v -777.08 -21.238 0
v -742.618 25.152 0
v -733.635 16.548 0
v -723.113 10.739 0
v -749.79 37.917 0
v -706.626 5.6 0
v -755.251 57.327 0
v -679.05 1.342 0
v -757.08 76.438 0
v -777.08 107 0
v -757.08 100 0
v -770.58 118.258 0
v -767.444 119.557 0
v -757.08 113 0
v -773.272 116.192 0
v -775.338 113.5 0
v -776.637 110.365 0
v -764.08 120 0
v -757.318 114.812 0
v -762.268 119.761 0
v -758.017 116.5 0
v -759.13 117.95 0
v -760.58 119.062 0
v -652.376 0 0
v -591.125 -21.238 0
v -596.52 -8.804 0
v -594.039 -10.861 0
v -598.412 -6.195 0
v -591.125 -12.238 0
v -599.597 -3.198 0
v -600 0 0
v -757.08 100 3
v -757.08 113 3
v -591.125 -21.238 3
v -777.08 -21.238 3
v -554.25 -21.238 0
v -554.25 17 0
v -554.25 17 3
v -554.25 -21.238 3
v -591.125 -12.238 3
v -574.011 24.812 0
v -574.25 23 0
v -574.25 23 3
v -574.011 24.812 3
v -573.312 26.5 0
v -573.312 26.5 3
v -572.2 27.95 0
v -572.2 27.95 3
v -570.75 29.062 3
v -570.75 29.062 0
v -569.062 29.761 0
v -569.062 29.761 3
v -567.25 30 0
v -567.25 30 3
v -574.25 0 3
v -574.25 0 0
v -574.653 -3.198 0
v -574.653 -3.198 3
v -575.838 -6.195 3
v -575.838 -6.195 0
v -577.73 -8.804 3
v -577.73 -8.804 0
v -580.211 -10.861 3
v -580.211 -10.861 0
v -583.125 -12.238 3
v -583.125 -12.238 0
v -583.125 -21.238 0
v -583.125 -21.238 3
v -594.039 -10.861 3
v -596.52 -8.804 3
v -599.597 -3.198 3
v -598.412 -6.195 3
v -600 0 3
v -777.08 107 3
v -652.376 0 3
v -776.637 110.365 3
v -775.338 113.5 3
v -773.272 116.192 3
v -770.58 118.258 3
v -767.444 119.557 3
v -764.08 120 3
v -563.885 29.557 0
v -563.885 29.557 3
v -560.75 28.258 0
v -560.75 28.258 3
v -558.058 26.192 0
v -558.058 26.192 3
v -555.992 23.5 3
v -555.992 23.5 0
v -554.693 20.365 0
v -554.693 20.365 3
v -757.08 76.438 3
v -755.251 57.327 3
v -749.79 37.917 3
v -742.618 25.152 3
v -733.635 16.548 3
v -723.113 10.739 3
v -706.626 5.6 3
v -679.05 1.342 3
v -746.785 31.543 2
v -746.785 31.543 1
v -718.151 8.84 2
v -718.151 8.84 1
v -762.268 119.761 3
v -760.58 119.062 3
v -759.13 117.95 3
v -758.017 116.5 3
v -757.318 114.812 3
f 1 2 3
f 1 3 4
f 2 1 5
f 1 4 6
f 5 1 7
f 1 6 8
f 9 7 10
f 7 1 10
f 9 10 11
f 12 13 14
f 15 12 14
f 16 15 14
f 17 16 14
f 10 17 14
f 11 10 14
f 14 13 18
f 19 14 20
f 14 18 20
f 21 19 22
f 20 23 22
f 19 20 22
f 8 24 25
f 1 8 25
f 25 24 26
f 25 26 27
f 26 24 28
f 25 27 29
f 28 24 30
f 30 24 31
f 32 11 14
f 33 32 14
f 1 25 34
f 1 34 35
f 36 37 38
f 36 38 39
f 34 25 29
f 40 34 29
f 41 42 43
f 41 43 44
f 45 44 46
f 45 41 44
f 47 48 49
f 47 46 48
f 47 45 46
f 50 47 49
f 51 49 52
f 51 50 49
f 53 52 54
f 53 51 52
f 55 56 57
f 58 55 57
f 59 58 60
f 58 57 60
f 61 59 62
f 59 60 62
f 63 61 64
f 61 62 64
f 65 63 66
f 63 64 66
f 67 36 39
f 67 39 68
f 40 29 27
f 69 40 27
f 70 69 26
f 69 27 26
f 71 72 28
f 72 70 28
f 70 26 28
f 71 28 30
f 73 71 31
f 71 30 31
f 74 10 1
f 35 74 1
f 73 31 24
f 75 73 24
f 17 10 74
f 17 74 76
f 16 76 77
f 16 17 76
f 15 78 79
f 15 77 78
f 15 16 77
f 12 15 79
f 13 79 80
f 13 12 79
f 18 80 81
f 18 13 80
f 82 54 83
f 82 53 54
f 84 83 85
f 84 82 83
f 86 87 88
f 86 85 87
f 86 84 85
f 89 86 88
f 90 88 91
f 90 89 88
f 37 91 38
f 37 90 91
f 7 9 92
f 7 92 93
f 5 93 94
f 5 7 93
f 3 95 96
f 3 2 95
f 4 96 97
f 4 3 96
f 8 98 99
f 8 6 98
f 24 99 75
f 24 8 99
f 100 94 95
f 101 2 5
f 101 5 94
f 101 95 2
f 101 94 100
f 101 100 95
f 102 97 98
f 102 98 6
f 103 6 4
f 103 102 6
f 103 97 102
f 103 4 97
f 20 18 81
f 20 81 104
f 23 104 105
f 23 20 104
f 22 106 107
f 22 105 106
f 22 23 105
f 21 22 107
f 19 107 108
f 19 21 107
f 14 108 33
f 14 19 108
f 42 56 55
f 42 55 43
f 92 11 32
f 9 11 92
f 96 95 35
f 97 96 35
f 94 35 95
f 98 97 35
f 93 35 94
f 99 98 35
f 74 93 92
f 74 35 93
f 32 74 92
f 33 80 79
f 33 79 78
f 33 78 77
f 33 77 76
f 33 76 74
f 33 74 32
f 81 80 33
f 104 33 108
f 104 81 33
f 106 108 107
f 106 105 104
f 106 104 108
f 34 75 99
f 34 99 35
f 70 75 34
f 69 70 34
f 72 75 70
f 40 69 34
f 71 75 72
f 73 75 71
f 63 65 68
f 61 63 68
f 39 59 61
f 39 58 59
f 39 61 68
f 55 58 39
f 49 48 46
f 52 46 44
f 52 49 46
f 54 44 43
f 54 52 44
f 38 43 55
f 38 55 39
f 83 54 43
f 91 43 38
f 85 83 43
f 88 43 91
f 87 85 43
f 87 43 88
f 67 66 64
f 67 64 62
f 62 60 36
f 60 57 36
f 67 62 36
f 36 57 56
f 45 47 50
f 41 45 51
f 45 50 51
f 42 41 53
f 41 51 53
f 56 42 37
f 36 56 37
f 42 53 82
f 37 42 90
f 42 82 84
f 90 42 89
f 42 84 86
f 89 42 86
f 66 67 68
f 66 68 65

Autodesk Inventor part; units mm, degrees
ref_plane "YZ Plane" through (0, 0, 0) normal (1, 0, 0) x (0, 1, 0)
ref_plane "XZ Plane" through (0, 0, 0) normal (0, 1, 0) x (-1, 0, 0)
ref_plane "XY Plane" through (0, 0, 0) normal (0, 0, 1) x (1, 0, 0)
sketch "Sketch3" plane through (0, 0, 0) normal (0, 0, 1) x (1, 0, 0)
  circle A0 centre (368.0481, 50) radius 50 construction
  line L0 (368.0481, 0) -> (514.9541, 0) construction
  line L1 (368.0481, 50) -> (514.9541, 50) construction
  line L2 (368.0481, 100) -> (514.9541, 100) construction
  line L3 (368.0481, 50) -> (343.0481, 6.6987) construction
  line L4 (368.0481, 50) -> (324.7469, 25) construction
  line L5 (368.0481, 50) -> (324.7469, 75) construction
  line L6 (343.0481, 93.3013) -> (368.0481, 50) construction
  line L7 (393.0481, 93.3013) -> (368.0481, 50) construction
  line L8 (411.3494, 75) -> (368.0481, 50) construction
  line L9 (411.3494, 25) -> (368.0481, 50) construction
  line L10 (393.0481, 6.6987) -> (368.0481, 50) construction
  line L11 (368.0481, 0) -> (368.0481, 100) construction
  line L12 (418.0481, 50) -> (368.0481, 50) construction
  line L13 (341.8682, 0) -> (341.8682, 100) construction
  line L14 (315.6883, 0) -> (315.6883, 100) construction
  line L15 (289.5083, 0) -> (289.5083, 100) construction
  line L16 (263.3284, 0) -> (263.3284, 100) construction
  line L17 (237.1485, 0) -> (237.1485, 100) construction
  line L18 (210.9685, 0) -> (210.9685, 100) construction
  line L19 (184.7886, 0) -> (184.7886, 100) construction
  line L20 (158.6086, 0) -> (158.6086, 100) construction
  circle A1 centre (315.6883, 50) radius 50 construction
  circle A2 centre (341.8682, 50) radius 50 construction
  circle A3 centre (289.5083, 50) radius 50 construction
  circle A4 centre (263.3284, 50) radius 50 construction
  circle A5 centre (237.1485, 50) radius 50 construction
  circle A6 centre (210.9685, 50) radius 50 construction
  line L21 (393.0481, 6.6987) -> (514.9541, 6.6987) construction
  line L22 (411.3494, 25) -> (514.9541, 25) construction
  line L23 (411.3494, 75) -> (514.9541, 75) construction
  line L24 (411.3494, 75) -> (514.9541, 75) construction
  line L25 (393.0481, 93.3013) -> (514.9541, 93.3013) construction
  line L26 (358.9895, 75) -> (339.5083, 50) construction
  line L27 (339.5083, 50) -> (306.6297, 25) construction
  line L28 (306.6297, 25) -> (262.1485, 6.6987) construction
  line L29 (262.1485, 6.6987) -> (210.9685, 0) construction
  line L30 (105.4843, -12.0642) -> (105.4843, 125.3083) construction
  line L31 (25.75, 0) -> (25.75, 23)
  line L32 (45.75, 17) -> (45.75, -21.2379)
  arc A7 (32.75, 30) -> (25.75, 23) centre (32.75, 23) ccw
  arc A8 (45.75, 17) -> (32.75, 30) centre (32.75, 17) ccw
  line L33 (32.75, 17) -> (45.75, 17) construction
  line L34 (32.75, 17) -> (32.75, 30) construction
  arc A9 (0, 0) -> (8.875, -12.2379) centre (12.875, 0) ccw
  arc A10 (16.875, -12.2379) -> (25.75, 0) centre (12.875, 0) ccw
  line L35 (45.75, -21.2379) -> (16.875, -21.2379)
  line L36 (8.875, -21.2379) -> (-177.0796, -21.2379)
  circle A11 centre (-144.2046, 110.3653) radius 12.875 construction
  line L37 (8.875, -21.2379) -> (8.875, -12.2379)
  line L38 (16.875, -21.2379) -> (16.875, -12.2379)
  line L39 (411.3494, 75) -> (158.6086, 75) construction
  line L40 (368.0481, 100) -> (158.6086, 100) construction
  line L41 (418.0481, 50) -> (158.6086, 50) construction
  line L42 (411.3494, 25) -> (158.6086, 25) construction
  line L43 (393.0481, 6.6987) -> (158.6086, 6.6987) construction
  line L44 (393.0481, 93.3013) -> (158.6086, 93.3013) construction
  line L45 (358.9895, 75) -> (366.8682, 93.3013) construction
  line L46 (366.8682, 93.3013) -> (368.0481, 100) construction
  spline S0 degree 4 poles (-157.0796, 100) (-157.0796, 88.9946) (-147.011, 72.6811) (-131.8577, 48.7932) (-88.4777, 17.6268) (-50.0176, 3.937) (-18.8717, 0) (0, 0) knots 0 0 0 0 0 0.264547 0.457223 0.66608 1 1 1 1 1
  line L47 (-157.0796, 100) -> (-157.0796, 81.2146) construction
  line L48 (0, 0) -> (-42.8818, 0) construction
  line L49 (-157.0796, 100) -> (-157.0796, 113)
  line L50 (-144.2046, 110.3653) -> (-157.0796, 110.3653) construction
  line L51 (-147.6984, 94.0277) -> (-120.1158, 108.3975) construction
  line L52 (-157.0796, 100) -> (0, 0) construction
  circle A12 centre (-147.2046, 105.4197) radius 9.875 construction
  line L53 (-147.2046, 105.4197) -> (-157.0796, 105.4197) construction
  line L54 (-146.1623, 94.828) -> (-144.7762, 92.1674) construction
  line L55 (-144.7762, 92.1674) -> (-142.2689, 93.4736) construction
  line L56 (-177.0796, 107) -> (-177.0796, -21.2379)
  arc A13 (-157.0796, 113) -> (-164.0796, 120) centre (-164.0796, 113) ccw
  line L57 (-164.0796, 113) -> (-164.0796, 120) construction
  line L58 (-164.0796, 113) -> (-157.0796, 113) construction
  arc A14 (-164.0796, 120) -> (-177.0796, 107) centre (-164.0796, 107) ccw
  line L59 (-164.0796, 107) -> (-177.0796, 107) construction
  line L60 (-164.0796, 107) -> (-164.0796, 120) construction
  line L61 (-457.0796, 100) -> (-300, 0)
  line L62 (-757.0796, 100) -> (-757.0796, 76.4376)
  line L63 (-600, 0) -> (-652.3765, 0)
  spline S1 degree 4 poles (-757.0796, 76.4376) (-757.0796, 65.0585) (-753.7776, 47.1407) (-745.4013, 7.8331) (-693.0053, 2.4317) (-668.8587, 0) (-652.3765, 0) knots 0 0 0 0 0 0.348765 0.598765 1 1 1 1 1
  line L64 (-477.0796, 107) -> (-477.0796, -21.2379)
  arc A15 (-464.0796, 120) -> (-477.0796, 107) centre (-464.0796, 107) ccw
  arc A16 (-457.0796, 113) -> (-464.0796, 120) centre (-464.0796, 113) ccw
  line L65 (-457.0796, 100) -> (-457.0796, 113)
  circle A17 centre (-447.2046, 105.4197) radius 9.875 construction
  circle A18 centre (-444.2046, 110.3653) radius 12.875 construction
  line L66 (-457.0796, 100) -> (-300, 0) construction
  line L67 (-447.6984, 94.0277) -> (-420.1158, 108.3975) construction
  line L68 (-444.7762, 92.1674) -> (-442.2689, 93.4736) construction
  line L69 (-446.1623, 94.828) -> (-444.7762, 92.1674) construction
  line L70 (-291.125, -21.2379) -> (-477.0796, -21.2379)
  arc A19 (-300, 0) -> (-291.125, -12.2379) centre (-287.125, 0) ccw
  line L71 (-291.125, -21.2379) -> (-291.125, -12.2379)
  line L72 (-283.125, -21.2379) -> (-283.125, -12.2379)
  arc A20 (-283.125, -12.2379) -> (-274.25, 0) centre (-287.125, 0) ccw
  line L73 (-254.25, -21.2379) -> (-283.125, -21.2379)
  line L74 (-254.25, 17) -> (-254.25, -21.2379)
  line L75 (-274.25, 0) -> (-274.25, 23)
  arc A21 (-267.25, 30) -> (-274.25, 23) centre (-267.25, 23) ccw
  arc A22 (-254.25, 17) -> (-267.25, 30) centre (-267.25, 17) ccw
  line L76 (-777.0796, 107) -> (-777.0796, -21.2379)
  arc A23 (-764.0796, 120) -> (-777.0796, 107) centre (-764.0796, 107) ccw
  arc A24 (-757.0796, 113) -> (-764.0796, 120) centre (-764.0796, 113) ccw
  line L77 (-757.0796, 100) -> (-757.0796, 113)
  circle A25 centre (-747.2046, 105.4197) radius 9.875 construction
  circle A26 centre (-744.2046, 110.3653) radius 12.875 construction
  line L78 (-757.0796, 100) -> (-600, 0) construction
  line L79 (-747.6984, 94.0277) -> (-720.1158, 108.3975) construction
  line L80 (-744.7762, 92.1674) -> (-742.2689, 93.4736) construction
  line L81 (-746.1623, 94.828) -> (-744.7762, 92.1674) construction
  line L82 (-591.125, -21.2379) -> (-777.0796, -21.2379)
  arc A27 (-600, 0) -> (-591.125, -12.2379) centre (-587.125, 0) ccw
  line L83 (-591.125, -21.2379) -> (-591.125, -12.2379)
  line L84 (-583.125, -21.2379) -> (-583.125, -12.2379)
  arc A28 (-583.125, -12.2379) -> (-574.25, 0) centre (-587.125, 0) ccw
  line L85 (-554.25, -21.2379) -> (-583.125, -21.2379)
  line L86 (-554.25, 17) -> (-554.25, -21.2379)
  line L87 (-574.25, 0) -> (-574.25, 23)
  arc A29 (-567.25, 30) -> (-574.25, 23) centre (-567.25, 23) ccw
  arc A30 (-554.25, 17) -> (-567.25, 30) centre (-567.25, 17) ccw
  line L88 (32.75, -233) -> (45.75, -233) construction
  line L89 (32.75, -233) -> (32.75, -220) construction
  arc A31 (45.75, -233) -> (32.75, -220) centre (32.75, -233) ccw construction
  line L90 (25.75, -250) -> (25.75, -227) construction
  line L91 (45.75, -233) -> (45.75, -271.2379) construction
  arc A32 (16.875, -262.2379) -> (25.75, -250) centre (12.875, -250) ccw construction
  line L92 (45.75, -271.2379) -> (16.875, -271.2379) construction
  arc A33 (0, -250) -> (8.875, -262.2379) centre (12.875, -250) ccw construction
  arc A34 (32.75, -220) -> (25.75, -227) centre (32.75, -227) ccw construction
  line L93 (8.875, -271.2379) -> (-177.0796, -271.2379) construction
  line L94 (-157.0796, -150) -> (0, -250) construction
  spline S2 degree 4 poles (-157.0796, -150) (-157.0796, -161.0054) (-147.011, -177.3189) (-131.8577, -201.2068) (-88.4777, -232.3732) (-50.0176, -246.063) (-18.8717, -250) (0, -250) knots 0 0 0 0 0 0.264547 0.457223 0.66608 1 1 1 1 1 construction
  line L95 (-177.0796, -143) -> (-177.0796, -271.2379)
  line L96 (-146.1623, -155.172) -> (-144.7762, -157.8326) construction
  line L97 (-144.7762, -157.8326) -> (-142.2689, -156.5264) construction
  line L98 (-147.6984, -155.9723) -> (-120.1158, -141.6025) construction
  line L99 (-157.0796, -150) -> (-157.0796, -168.7854) construction
  line L100 (-147.2046, -144.5803) -> (-157.0796, -144.5803) construction
  line L101 (-144.2046, -139.6347) -> (-157.0796, -139.6347) construction
  circle A35 centre (-147.2046, -144.5803) radius 9.875 construction
  line L102 (0, -250) -> (-42.8818, -250) construction
  line L103 (16.875, -271.2379) -> (16.875, -262.2379) construction
  line L104 (8.875, -271.2379) -> (8.875, -262.2379) construction
  circle A36 centre (-144.2046, -139.6347) radius 12.875 construction
  line L105 (-164.0796, -143) -> (-177.0796, -143) construction
  line L106 (-157.0796, -150) -> (-157.0796, -137) construction
  line L107 (-164.0796, -137) -> (-157.0796, -137) construction
  arc A37 (-157.0796, -137) -> (-164.0796, -130) centre (-164.0796, -137) ccw
  line L108 (-164.0796, -137) -> (-164.0796, -130) construction
  line L109 (-164.0796, -143) -> (-164.0796, -130) construction
  arc A38 (-164.0796, -130) -> (-177.0796, -143) centre (-164.0796, -143) ccw
  arc A39 (32.75, -227) -> (25.75, -234) centre (32.75, -234) ccw
  line L110 (32.75, -234) -> (25.75, -234) construction
  line L111 (32.75, -234) -> (32.75, -227) construction
  line L112 (45.75, -271.2379) -> (-177.0796, -271.2379)
  arc A40 (45.75, -240) -> (32.75, -227) centre (32.75, -240) ccw
  line L113 (32.75, -240) -> (45.75, -240) construction
  line L114 (32.75, -240) -> (32.75, -227) construction
  line L115 (45.75, -240) -> (45.75, -271.2379)
  line L116 (0, -242) -> (25.75, -242)
  line L117 (25.75, -234) -> (25.75, -242)
  line L118 (-149.0796, -145.6094) -> (-149.0796, -150)
  line L119 (-149.0796, -145.6094) -> (-157.0796, -140.5164)
  line L120 (-157.0796, -140.5164) -> (-157.0796, -137)
  line L121 (57.9242, -250) -> (-50.1018, -250) construction
  spline S3 degree 4 poles (-149.0796, -150) (-149.0796, -154.1011) (-147.2668, -159.7716) (-135.8793, -178.0796) (-120.229, -197.0865) (-83.3361, -225.9308) (-47.2959, -235.9761) (-18.0598, -242) (0, -242) knots 0 0 0 0 0 0.173174 0.31592 0.488873 0.682943 1 1 1 1 1
  line L122 (-158.9844, -148.7874) -> (-160.5796, -147.7718) construction
  line L123 (-149.0796, -145.6094) -> (2.3304, -242) construction
  line L124 (-149.0796, -145.6094) -> (-139.5059, -151.7042)
  line L125 (-146.1623, -155.172) -> (-139.5059, -151.7042)
  line L126 (-144.7762, -157.8326) -> (-146.1623, -155.172)
  line L127 (-144.7762, -157.8326) -> (-136.5837, -153.5646)
  line L128 (-136.5837, -153.5646) -> (-134.053, -155.1756)
  line L129 (-136.5837, -153.5646) -> (-136.7042, -153.7538) construction
  line L130 (-134.053, -155.1756) -> (-134.1481, -155.3251) construction
  spline S4 degree 4 poles (-134.053, -155.1756) (-136.385, -157.4458) (-136.0537, -162.1257) (-140.7465, -169.8747) (-137.1035, -175.12) knots 0 0 0 0 0 1 1 1 1 1
  line L131 (-134.053, -155.1756) -> (-131.4385, -154.0999) construction
  line L132 (-254.25, -271.2379) -> (-477.0796, -271.2379)
  line L133 (-477.0796, -143) -> (-477.0796, -271.2379)
  arc A41 (-464.0796, -130) -> (-477.0796, -143) centre (-464.0796, -143) ccw
  arc A42 (-457.0796, -137) -> (-464.0796, -130) centre (-464.0796, -137) ccw
  line L134 (-457.0796, -140.5164) -> (-457.0796, -137)
  line L135 (-449.0796, -145.6094) -> (-457.0796, -140.5164)
  line L136 (-449.0796, -145.6094) -> (-439.5059, -151.7042)
  line L137 (-446.1623, -155.172) -> (-439.5059, -151.7042)
  line L138 (-444.7762, -157.8326) -> (-446.1623, -155.172)
  line L139 (-444.7762, -157.8326) -> (-436.5837, -153.5646)
  line L140 (-436.5837, -153.5646) -> (-434.053, -155.1756)
  line L141 (-449.0796, -145.6094) -> (-297.6696, -242) construction
  line L142 (-300, -242) -> (-274.25, -242)
  line L143 (-274.25, -234) -> (-274.25, -242)
  arc A43 (-267.25, -227) -> (-274.25, -234) centre (-267.25, -234) ccw
  arc A44 (-254.25, -240) -> (-267.25, -227) centre (-267.25, -240) ccw
  line L144 (-254.25, -240) -> (-254.25, -271.2379)
  circle A45 centre (-447.2046, -144.5803) radius 9.875 construction
  line L145 (-457.0796, -150) -> (-300, -250) construction
  circle A46 centre (-444.2046, -139.6347) radius 12.875 construction
  line L146 (-554.25, -271.2379) -> (-777.0796, -271.2379)
  line L147 (-777.0796, -143) -> (-777.0796, -271.2379)
  arc A47 (-764.0796, -130) -> (-777.0796, -143) centre (-764.0796, -143) ccw
  arc A48 (-757.0796, -137) -> (-764.0796, -130) centre (-764.0796, -137) ccw
  line L148 (-757.0796, -140.5164) -> (-757.0796, -137)
  line L149 (-749.0796, -145.6094) -> (-757.0796, -140.5164)
  line L150 (-749.0796, -145.6094) -> (-739.5059, -151.7042)
  line L151 (-746.1623, -155.172) -> (-739.5059, -151.7042)
  line L152 (-744.7762, -157.8326) -> (-746.1623, -155.172)
  line L153 (-744.7762, -157.8326) -> (-736.5837, -153.5646)
  line L154 (-736.5837, -153.5646) -> (-734.053, -155.1756)
  line L155 (-749.0796, -145.6094) -> (-597.6696, -242) construction
  line L156 (-600, -242) -> (-574.25, -242)
  line L157 (-574.25, -234) -> (-574.25, -242)
  arc A49 (-567.25, -227) -> (-574.25, -234) centre (-567.25, -234) ccw
  arc A50 (-554.25, -240) -> (-567.25, -227) centre (-567.25, -240) ccw
  line L158 (-554.25, -240) -> (-554.25, -271.2379)
  circle A51 centre (-747.2046, -144.5803) radius 9.875 construction
  line L159 (-757.0796, -150) -> (-600, -250) construction
  circle A52 centre (-744.2046, -139.6347) radius 12.875 construction
  line L160 (-297.6696, -242) -> (-434.053, -155.1756)
  spline S5 degree 4 poles (-757.0796, -173.5624) (-757.0796, -184.9415) (-753.7776, -202.8593) (-745.4013, -242.1669) (-693.0053, -247.5683) (-668.8587, -250) (-652.3765, -250) knots 0 0 0 0 0 0.348765 0.598765 1 1 1 1 1 construction
  line L161 (-757.0796, -150) -> (-757.0796, -173.5624)
  line L162 (-600, -250) -> (-652.3765, -250) construction
  line L163 (-600, -242) -> (-652.3765, -242)
  spline S6 degree 4 poles (-749.0796, -173.5624) (-749.0796, -183.7991) (-746.0176, -199.7502) (-737.9559, -236.335) (-690.8375, -239.2991) (-667.8077, -242) (-652.3765, -242) knots 0 0 0 0 0 0.346383 0.596383 1 1 1 1 1
  line L164 (-749.0796, -173.5624) -> (-749.0796, -170.035) construction
  spline S7 degree 3 poles (-734.053, -155.1756) (-737.3186, -159.7629) (-749.7015, -168.8589) (-748.818, -180.0805) knots 0 0 0 0 1 1 1 1
  point P0 (158.6086, 0)
  point P1 (-148.021, 75)
  point P2 (-128.5398, 50)
  point P3 (-95.6611, 25)
  point P4 (-51.1799, 6.6987)
  point P5 (-155.8997, 93.3013)
  point P6 (-753.2027, 48.1984)
  point P7 (-737.7866, 19.9116)
  point P8 (-697.6619, 3.8098)
  point P9 (-457.0796, 110.3653)
  point P10 (-457.0796, 105.4197)
  point P11 (-757.0796, 110.3653)
  point P12 (-757.0796, 105.4197)
  point P13 (-51.1799, -243.3013)
  point P14 (-95.6611, -225)
  point P15 (-148.021, -175)
  point P16 (-128.5398, -200)
  point P17 (-155.8997, -156.6987)
  point P18 (-157.0796, -141.4334)
  point P19 (-153.0796, -143.0629)
  point P20 (-152.1421, -144.5803)
  point P21 (3.9112, -250)
  point P22 (-147.2046, -158.2164)
  point P23 (-137.7547, -174.1759)
  point P24 (-121.904, -193.5196)
  point P25 (-91.5665, -216.9339)
  point P26 (-48.8291, -234.4712)
  point P27 (-135.7378, -158.235)
  point P28 (-137.8094, -165.5825)
  point P29 (-453.0796, -143.0629)
  point P30 (-457.0796, -144.5803)
  point P31 (-447.6984, -155.9723)
  point P32 (-457.0796, -139.6347)
  point P33 (-753.0796, -143.0629)
  point P34 (-757.0796, -144.5803)
  point P35 (-747.6984, -155.9723)
  point P36 (-757.0796, -139.6347)
  point P37 (-753.2027, -201.8016)
  point P38 (-737.7866, -230.0884)
  point P39 (-697.6619, -246.1902)
  point P40 (-745.4939, -198.9007)
  point P41 (-731.3987, -224.5882)
  point P42 (-695.3384, -238.4632)
  point P43 (-741.9594, -163.8889)
  point P44 (-300, 0)
  dimension "d43" = 25.75
  dimension "d53" = 19.75
  dimension "diameter" = 100
  dimension "d8" = 26.1799
  dimension "d14" = 30
  dimension "d15" = 30
  dimension "d16" = 30
  dimension "d26" = 90
  dimension "stopper" = 30
  dimension "stopperthickness" = 20
  dimension "d32" = 12.875
  dimension "d33" = 12.875
  dimension "d38" = 6
  dimension "d47" = 8
  dimension "d49" = 9
  dimension "d55" = 120
  dimension "d56" = 3
  dimension "d57" = 90
  dimension "d58" = 90
  dimension "d59" = 20
  dimension "d60" = 6
  dimension "d61" = 20
  dimension "d62" = 28.875
  dimension "d72" = 300
  dimension "d93" = 250
  dimension "d98" = 90
  dimension "d99" = 44.2379
  dimension "d100" = 37.2379
  dimension "d101" = 90
  dimension "railheight" = 8
  dimension "d104" = 8
  dimension "d105" = 8
  dimension "d106" = 3
  dimension "d109" = 300
  dimension "d116" = 250
  dimension "d121" = 8
extrude "Extrusion1" add sketch "Sketch3" along normal blind 3 contours L62 S1 L63 A27 L83 L82 L76 A23 A24 L77 | L84 A28 L87 A29 A30 L86 L85
equation "\"d8\" = 0.261799 * diameter"
properties part number "steep-path"
